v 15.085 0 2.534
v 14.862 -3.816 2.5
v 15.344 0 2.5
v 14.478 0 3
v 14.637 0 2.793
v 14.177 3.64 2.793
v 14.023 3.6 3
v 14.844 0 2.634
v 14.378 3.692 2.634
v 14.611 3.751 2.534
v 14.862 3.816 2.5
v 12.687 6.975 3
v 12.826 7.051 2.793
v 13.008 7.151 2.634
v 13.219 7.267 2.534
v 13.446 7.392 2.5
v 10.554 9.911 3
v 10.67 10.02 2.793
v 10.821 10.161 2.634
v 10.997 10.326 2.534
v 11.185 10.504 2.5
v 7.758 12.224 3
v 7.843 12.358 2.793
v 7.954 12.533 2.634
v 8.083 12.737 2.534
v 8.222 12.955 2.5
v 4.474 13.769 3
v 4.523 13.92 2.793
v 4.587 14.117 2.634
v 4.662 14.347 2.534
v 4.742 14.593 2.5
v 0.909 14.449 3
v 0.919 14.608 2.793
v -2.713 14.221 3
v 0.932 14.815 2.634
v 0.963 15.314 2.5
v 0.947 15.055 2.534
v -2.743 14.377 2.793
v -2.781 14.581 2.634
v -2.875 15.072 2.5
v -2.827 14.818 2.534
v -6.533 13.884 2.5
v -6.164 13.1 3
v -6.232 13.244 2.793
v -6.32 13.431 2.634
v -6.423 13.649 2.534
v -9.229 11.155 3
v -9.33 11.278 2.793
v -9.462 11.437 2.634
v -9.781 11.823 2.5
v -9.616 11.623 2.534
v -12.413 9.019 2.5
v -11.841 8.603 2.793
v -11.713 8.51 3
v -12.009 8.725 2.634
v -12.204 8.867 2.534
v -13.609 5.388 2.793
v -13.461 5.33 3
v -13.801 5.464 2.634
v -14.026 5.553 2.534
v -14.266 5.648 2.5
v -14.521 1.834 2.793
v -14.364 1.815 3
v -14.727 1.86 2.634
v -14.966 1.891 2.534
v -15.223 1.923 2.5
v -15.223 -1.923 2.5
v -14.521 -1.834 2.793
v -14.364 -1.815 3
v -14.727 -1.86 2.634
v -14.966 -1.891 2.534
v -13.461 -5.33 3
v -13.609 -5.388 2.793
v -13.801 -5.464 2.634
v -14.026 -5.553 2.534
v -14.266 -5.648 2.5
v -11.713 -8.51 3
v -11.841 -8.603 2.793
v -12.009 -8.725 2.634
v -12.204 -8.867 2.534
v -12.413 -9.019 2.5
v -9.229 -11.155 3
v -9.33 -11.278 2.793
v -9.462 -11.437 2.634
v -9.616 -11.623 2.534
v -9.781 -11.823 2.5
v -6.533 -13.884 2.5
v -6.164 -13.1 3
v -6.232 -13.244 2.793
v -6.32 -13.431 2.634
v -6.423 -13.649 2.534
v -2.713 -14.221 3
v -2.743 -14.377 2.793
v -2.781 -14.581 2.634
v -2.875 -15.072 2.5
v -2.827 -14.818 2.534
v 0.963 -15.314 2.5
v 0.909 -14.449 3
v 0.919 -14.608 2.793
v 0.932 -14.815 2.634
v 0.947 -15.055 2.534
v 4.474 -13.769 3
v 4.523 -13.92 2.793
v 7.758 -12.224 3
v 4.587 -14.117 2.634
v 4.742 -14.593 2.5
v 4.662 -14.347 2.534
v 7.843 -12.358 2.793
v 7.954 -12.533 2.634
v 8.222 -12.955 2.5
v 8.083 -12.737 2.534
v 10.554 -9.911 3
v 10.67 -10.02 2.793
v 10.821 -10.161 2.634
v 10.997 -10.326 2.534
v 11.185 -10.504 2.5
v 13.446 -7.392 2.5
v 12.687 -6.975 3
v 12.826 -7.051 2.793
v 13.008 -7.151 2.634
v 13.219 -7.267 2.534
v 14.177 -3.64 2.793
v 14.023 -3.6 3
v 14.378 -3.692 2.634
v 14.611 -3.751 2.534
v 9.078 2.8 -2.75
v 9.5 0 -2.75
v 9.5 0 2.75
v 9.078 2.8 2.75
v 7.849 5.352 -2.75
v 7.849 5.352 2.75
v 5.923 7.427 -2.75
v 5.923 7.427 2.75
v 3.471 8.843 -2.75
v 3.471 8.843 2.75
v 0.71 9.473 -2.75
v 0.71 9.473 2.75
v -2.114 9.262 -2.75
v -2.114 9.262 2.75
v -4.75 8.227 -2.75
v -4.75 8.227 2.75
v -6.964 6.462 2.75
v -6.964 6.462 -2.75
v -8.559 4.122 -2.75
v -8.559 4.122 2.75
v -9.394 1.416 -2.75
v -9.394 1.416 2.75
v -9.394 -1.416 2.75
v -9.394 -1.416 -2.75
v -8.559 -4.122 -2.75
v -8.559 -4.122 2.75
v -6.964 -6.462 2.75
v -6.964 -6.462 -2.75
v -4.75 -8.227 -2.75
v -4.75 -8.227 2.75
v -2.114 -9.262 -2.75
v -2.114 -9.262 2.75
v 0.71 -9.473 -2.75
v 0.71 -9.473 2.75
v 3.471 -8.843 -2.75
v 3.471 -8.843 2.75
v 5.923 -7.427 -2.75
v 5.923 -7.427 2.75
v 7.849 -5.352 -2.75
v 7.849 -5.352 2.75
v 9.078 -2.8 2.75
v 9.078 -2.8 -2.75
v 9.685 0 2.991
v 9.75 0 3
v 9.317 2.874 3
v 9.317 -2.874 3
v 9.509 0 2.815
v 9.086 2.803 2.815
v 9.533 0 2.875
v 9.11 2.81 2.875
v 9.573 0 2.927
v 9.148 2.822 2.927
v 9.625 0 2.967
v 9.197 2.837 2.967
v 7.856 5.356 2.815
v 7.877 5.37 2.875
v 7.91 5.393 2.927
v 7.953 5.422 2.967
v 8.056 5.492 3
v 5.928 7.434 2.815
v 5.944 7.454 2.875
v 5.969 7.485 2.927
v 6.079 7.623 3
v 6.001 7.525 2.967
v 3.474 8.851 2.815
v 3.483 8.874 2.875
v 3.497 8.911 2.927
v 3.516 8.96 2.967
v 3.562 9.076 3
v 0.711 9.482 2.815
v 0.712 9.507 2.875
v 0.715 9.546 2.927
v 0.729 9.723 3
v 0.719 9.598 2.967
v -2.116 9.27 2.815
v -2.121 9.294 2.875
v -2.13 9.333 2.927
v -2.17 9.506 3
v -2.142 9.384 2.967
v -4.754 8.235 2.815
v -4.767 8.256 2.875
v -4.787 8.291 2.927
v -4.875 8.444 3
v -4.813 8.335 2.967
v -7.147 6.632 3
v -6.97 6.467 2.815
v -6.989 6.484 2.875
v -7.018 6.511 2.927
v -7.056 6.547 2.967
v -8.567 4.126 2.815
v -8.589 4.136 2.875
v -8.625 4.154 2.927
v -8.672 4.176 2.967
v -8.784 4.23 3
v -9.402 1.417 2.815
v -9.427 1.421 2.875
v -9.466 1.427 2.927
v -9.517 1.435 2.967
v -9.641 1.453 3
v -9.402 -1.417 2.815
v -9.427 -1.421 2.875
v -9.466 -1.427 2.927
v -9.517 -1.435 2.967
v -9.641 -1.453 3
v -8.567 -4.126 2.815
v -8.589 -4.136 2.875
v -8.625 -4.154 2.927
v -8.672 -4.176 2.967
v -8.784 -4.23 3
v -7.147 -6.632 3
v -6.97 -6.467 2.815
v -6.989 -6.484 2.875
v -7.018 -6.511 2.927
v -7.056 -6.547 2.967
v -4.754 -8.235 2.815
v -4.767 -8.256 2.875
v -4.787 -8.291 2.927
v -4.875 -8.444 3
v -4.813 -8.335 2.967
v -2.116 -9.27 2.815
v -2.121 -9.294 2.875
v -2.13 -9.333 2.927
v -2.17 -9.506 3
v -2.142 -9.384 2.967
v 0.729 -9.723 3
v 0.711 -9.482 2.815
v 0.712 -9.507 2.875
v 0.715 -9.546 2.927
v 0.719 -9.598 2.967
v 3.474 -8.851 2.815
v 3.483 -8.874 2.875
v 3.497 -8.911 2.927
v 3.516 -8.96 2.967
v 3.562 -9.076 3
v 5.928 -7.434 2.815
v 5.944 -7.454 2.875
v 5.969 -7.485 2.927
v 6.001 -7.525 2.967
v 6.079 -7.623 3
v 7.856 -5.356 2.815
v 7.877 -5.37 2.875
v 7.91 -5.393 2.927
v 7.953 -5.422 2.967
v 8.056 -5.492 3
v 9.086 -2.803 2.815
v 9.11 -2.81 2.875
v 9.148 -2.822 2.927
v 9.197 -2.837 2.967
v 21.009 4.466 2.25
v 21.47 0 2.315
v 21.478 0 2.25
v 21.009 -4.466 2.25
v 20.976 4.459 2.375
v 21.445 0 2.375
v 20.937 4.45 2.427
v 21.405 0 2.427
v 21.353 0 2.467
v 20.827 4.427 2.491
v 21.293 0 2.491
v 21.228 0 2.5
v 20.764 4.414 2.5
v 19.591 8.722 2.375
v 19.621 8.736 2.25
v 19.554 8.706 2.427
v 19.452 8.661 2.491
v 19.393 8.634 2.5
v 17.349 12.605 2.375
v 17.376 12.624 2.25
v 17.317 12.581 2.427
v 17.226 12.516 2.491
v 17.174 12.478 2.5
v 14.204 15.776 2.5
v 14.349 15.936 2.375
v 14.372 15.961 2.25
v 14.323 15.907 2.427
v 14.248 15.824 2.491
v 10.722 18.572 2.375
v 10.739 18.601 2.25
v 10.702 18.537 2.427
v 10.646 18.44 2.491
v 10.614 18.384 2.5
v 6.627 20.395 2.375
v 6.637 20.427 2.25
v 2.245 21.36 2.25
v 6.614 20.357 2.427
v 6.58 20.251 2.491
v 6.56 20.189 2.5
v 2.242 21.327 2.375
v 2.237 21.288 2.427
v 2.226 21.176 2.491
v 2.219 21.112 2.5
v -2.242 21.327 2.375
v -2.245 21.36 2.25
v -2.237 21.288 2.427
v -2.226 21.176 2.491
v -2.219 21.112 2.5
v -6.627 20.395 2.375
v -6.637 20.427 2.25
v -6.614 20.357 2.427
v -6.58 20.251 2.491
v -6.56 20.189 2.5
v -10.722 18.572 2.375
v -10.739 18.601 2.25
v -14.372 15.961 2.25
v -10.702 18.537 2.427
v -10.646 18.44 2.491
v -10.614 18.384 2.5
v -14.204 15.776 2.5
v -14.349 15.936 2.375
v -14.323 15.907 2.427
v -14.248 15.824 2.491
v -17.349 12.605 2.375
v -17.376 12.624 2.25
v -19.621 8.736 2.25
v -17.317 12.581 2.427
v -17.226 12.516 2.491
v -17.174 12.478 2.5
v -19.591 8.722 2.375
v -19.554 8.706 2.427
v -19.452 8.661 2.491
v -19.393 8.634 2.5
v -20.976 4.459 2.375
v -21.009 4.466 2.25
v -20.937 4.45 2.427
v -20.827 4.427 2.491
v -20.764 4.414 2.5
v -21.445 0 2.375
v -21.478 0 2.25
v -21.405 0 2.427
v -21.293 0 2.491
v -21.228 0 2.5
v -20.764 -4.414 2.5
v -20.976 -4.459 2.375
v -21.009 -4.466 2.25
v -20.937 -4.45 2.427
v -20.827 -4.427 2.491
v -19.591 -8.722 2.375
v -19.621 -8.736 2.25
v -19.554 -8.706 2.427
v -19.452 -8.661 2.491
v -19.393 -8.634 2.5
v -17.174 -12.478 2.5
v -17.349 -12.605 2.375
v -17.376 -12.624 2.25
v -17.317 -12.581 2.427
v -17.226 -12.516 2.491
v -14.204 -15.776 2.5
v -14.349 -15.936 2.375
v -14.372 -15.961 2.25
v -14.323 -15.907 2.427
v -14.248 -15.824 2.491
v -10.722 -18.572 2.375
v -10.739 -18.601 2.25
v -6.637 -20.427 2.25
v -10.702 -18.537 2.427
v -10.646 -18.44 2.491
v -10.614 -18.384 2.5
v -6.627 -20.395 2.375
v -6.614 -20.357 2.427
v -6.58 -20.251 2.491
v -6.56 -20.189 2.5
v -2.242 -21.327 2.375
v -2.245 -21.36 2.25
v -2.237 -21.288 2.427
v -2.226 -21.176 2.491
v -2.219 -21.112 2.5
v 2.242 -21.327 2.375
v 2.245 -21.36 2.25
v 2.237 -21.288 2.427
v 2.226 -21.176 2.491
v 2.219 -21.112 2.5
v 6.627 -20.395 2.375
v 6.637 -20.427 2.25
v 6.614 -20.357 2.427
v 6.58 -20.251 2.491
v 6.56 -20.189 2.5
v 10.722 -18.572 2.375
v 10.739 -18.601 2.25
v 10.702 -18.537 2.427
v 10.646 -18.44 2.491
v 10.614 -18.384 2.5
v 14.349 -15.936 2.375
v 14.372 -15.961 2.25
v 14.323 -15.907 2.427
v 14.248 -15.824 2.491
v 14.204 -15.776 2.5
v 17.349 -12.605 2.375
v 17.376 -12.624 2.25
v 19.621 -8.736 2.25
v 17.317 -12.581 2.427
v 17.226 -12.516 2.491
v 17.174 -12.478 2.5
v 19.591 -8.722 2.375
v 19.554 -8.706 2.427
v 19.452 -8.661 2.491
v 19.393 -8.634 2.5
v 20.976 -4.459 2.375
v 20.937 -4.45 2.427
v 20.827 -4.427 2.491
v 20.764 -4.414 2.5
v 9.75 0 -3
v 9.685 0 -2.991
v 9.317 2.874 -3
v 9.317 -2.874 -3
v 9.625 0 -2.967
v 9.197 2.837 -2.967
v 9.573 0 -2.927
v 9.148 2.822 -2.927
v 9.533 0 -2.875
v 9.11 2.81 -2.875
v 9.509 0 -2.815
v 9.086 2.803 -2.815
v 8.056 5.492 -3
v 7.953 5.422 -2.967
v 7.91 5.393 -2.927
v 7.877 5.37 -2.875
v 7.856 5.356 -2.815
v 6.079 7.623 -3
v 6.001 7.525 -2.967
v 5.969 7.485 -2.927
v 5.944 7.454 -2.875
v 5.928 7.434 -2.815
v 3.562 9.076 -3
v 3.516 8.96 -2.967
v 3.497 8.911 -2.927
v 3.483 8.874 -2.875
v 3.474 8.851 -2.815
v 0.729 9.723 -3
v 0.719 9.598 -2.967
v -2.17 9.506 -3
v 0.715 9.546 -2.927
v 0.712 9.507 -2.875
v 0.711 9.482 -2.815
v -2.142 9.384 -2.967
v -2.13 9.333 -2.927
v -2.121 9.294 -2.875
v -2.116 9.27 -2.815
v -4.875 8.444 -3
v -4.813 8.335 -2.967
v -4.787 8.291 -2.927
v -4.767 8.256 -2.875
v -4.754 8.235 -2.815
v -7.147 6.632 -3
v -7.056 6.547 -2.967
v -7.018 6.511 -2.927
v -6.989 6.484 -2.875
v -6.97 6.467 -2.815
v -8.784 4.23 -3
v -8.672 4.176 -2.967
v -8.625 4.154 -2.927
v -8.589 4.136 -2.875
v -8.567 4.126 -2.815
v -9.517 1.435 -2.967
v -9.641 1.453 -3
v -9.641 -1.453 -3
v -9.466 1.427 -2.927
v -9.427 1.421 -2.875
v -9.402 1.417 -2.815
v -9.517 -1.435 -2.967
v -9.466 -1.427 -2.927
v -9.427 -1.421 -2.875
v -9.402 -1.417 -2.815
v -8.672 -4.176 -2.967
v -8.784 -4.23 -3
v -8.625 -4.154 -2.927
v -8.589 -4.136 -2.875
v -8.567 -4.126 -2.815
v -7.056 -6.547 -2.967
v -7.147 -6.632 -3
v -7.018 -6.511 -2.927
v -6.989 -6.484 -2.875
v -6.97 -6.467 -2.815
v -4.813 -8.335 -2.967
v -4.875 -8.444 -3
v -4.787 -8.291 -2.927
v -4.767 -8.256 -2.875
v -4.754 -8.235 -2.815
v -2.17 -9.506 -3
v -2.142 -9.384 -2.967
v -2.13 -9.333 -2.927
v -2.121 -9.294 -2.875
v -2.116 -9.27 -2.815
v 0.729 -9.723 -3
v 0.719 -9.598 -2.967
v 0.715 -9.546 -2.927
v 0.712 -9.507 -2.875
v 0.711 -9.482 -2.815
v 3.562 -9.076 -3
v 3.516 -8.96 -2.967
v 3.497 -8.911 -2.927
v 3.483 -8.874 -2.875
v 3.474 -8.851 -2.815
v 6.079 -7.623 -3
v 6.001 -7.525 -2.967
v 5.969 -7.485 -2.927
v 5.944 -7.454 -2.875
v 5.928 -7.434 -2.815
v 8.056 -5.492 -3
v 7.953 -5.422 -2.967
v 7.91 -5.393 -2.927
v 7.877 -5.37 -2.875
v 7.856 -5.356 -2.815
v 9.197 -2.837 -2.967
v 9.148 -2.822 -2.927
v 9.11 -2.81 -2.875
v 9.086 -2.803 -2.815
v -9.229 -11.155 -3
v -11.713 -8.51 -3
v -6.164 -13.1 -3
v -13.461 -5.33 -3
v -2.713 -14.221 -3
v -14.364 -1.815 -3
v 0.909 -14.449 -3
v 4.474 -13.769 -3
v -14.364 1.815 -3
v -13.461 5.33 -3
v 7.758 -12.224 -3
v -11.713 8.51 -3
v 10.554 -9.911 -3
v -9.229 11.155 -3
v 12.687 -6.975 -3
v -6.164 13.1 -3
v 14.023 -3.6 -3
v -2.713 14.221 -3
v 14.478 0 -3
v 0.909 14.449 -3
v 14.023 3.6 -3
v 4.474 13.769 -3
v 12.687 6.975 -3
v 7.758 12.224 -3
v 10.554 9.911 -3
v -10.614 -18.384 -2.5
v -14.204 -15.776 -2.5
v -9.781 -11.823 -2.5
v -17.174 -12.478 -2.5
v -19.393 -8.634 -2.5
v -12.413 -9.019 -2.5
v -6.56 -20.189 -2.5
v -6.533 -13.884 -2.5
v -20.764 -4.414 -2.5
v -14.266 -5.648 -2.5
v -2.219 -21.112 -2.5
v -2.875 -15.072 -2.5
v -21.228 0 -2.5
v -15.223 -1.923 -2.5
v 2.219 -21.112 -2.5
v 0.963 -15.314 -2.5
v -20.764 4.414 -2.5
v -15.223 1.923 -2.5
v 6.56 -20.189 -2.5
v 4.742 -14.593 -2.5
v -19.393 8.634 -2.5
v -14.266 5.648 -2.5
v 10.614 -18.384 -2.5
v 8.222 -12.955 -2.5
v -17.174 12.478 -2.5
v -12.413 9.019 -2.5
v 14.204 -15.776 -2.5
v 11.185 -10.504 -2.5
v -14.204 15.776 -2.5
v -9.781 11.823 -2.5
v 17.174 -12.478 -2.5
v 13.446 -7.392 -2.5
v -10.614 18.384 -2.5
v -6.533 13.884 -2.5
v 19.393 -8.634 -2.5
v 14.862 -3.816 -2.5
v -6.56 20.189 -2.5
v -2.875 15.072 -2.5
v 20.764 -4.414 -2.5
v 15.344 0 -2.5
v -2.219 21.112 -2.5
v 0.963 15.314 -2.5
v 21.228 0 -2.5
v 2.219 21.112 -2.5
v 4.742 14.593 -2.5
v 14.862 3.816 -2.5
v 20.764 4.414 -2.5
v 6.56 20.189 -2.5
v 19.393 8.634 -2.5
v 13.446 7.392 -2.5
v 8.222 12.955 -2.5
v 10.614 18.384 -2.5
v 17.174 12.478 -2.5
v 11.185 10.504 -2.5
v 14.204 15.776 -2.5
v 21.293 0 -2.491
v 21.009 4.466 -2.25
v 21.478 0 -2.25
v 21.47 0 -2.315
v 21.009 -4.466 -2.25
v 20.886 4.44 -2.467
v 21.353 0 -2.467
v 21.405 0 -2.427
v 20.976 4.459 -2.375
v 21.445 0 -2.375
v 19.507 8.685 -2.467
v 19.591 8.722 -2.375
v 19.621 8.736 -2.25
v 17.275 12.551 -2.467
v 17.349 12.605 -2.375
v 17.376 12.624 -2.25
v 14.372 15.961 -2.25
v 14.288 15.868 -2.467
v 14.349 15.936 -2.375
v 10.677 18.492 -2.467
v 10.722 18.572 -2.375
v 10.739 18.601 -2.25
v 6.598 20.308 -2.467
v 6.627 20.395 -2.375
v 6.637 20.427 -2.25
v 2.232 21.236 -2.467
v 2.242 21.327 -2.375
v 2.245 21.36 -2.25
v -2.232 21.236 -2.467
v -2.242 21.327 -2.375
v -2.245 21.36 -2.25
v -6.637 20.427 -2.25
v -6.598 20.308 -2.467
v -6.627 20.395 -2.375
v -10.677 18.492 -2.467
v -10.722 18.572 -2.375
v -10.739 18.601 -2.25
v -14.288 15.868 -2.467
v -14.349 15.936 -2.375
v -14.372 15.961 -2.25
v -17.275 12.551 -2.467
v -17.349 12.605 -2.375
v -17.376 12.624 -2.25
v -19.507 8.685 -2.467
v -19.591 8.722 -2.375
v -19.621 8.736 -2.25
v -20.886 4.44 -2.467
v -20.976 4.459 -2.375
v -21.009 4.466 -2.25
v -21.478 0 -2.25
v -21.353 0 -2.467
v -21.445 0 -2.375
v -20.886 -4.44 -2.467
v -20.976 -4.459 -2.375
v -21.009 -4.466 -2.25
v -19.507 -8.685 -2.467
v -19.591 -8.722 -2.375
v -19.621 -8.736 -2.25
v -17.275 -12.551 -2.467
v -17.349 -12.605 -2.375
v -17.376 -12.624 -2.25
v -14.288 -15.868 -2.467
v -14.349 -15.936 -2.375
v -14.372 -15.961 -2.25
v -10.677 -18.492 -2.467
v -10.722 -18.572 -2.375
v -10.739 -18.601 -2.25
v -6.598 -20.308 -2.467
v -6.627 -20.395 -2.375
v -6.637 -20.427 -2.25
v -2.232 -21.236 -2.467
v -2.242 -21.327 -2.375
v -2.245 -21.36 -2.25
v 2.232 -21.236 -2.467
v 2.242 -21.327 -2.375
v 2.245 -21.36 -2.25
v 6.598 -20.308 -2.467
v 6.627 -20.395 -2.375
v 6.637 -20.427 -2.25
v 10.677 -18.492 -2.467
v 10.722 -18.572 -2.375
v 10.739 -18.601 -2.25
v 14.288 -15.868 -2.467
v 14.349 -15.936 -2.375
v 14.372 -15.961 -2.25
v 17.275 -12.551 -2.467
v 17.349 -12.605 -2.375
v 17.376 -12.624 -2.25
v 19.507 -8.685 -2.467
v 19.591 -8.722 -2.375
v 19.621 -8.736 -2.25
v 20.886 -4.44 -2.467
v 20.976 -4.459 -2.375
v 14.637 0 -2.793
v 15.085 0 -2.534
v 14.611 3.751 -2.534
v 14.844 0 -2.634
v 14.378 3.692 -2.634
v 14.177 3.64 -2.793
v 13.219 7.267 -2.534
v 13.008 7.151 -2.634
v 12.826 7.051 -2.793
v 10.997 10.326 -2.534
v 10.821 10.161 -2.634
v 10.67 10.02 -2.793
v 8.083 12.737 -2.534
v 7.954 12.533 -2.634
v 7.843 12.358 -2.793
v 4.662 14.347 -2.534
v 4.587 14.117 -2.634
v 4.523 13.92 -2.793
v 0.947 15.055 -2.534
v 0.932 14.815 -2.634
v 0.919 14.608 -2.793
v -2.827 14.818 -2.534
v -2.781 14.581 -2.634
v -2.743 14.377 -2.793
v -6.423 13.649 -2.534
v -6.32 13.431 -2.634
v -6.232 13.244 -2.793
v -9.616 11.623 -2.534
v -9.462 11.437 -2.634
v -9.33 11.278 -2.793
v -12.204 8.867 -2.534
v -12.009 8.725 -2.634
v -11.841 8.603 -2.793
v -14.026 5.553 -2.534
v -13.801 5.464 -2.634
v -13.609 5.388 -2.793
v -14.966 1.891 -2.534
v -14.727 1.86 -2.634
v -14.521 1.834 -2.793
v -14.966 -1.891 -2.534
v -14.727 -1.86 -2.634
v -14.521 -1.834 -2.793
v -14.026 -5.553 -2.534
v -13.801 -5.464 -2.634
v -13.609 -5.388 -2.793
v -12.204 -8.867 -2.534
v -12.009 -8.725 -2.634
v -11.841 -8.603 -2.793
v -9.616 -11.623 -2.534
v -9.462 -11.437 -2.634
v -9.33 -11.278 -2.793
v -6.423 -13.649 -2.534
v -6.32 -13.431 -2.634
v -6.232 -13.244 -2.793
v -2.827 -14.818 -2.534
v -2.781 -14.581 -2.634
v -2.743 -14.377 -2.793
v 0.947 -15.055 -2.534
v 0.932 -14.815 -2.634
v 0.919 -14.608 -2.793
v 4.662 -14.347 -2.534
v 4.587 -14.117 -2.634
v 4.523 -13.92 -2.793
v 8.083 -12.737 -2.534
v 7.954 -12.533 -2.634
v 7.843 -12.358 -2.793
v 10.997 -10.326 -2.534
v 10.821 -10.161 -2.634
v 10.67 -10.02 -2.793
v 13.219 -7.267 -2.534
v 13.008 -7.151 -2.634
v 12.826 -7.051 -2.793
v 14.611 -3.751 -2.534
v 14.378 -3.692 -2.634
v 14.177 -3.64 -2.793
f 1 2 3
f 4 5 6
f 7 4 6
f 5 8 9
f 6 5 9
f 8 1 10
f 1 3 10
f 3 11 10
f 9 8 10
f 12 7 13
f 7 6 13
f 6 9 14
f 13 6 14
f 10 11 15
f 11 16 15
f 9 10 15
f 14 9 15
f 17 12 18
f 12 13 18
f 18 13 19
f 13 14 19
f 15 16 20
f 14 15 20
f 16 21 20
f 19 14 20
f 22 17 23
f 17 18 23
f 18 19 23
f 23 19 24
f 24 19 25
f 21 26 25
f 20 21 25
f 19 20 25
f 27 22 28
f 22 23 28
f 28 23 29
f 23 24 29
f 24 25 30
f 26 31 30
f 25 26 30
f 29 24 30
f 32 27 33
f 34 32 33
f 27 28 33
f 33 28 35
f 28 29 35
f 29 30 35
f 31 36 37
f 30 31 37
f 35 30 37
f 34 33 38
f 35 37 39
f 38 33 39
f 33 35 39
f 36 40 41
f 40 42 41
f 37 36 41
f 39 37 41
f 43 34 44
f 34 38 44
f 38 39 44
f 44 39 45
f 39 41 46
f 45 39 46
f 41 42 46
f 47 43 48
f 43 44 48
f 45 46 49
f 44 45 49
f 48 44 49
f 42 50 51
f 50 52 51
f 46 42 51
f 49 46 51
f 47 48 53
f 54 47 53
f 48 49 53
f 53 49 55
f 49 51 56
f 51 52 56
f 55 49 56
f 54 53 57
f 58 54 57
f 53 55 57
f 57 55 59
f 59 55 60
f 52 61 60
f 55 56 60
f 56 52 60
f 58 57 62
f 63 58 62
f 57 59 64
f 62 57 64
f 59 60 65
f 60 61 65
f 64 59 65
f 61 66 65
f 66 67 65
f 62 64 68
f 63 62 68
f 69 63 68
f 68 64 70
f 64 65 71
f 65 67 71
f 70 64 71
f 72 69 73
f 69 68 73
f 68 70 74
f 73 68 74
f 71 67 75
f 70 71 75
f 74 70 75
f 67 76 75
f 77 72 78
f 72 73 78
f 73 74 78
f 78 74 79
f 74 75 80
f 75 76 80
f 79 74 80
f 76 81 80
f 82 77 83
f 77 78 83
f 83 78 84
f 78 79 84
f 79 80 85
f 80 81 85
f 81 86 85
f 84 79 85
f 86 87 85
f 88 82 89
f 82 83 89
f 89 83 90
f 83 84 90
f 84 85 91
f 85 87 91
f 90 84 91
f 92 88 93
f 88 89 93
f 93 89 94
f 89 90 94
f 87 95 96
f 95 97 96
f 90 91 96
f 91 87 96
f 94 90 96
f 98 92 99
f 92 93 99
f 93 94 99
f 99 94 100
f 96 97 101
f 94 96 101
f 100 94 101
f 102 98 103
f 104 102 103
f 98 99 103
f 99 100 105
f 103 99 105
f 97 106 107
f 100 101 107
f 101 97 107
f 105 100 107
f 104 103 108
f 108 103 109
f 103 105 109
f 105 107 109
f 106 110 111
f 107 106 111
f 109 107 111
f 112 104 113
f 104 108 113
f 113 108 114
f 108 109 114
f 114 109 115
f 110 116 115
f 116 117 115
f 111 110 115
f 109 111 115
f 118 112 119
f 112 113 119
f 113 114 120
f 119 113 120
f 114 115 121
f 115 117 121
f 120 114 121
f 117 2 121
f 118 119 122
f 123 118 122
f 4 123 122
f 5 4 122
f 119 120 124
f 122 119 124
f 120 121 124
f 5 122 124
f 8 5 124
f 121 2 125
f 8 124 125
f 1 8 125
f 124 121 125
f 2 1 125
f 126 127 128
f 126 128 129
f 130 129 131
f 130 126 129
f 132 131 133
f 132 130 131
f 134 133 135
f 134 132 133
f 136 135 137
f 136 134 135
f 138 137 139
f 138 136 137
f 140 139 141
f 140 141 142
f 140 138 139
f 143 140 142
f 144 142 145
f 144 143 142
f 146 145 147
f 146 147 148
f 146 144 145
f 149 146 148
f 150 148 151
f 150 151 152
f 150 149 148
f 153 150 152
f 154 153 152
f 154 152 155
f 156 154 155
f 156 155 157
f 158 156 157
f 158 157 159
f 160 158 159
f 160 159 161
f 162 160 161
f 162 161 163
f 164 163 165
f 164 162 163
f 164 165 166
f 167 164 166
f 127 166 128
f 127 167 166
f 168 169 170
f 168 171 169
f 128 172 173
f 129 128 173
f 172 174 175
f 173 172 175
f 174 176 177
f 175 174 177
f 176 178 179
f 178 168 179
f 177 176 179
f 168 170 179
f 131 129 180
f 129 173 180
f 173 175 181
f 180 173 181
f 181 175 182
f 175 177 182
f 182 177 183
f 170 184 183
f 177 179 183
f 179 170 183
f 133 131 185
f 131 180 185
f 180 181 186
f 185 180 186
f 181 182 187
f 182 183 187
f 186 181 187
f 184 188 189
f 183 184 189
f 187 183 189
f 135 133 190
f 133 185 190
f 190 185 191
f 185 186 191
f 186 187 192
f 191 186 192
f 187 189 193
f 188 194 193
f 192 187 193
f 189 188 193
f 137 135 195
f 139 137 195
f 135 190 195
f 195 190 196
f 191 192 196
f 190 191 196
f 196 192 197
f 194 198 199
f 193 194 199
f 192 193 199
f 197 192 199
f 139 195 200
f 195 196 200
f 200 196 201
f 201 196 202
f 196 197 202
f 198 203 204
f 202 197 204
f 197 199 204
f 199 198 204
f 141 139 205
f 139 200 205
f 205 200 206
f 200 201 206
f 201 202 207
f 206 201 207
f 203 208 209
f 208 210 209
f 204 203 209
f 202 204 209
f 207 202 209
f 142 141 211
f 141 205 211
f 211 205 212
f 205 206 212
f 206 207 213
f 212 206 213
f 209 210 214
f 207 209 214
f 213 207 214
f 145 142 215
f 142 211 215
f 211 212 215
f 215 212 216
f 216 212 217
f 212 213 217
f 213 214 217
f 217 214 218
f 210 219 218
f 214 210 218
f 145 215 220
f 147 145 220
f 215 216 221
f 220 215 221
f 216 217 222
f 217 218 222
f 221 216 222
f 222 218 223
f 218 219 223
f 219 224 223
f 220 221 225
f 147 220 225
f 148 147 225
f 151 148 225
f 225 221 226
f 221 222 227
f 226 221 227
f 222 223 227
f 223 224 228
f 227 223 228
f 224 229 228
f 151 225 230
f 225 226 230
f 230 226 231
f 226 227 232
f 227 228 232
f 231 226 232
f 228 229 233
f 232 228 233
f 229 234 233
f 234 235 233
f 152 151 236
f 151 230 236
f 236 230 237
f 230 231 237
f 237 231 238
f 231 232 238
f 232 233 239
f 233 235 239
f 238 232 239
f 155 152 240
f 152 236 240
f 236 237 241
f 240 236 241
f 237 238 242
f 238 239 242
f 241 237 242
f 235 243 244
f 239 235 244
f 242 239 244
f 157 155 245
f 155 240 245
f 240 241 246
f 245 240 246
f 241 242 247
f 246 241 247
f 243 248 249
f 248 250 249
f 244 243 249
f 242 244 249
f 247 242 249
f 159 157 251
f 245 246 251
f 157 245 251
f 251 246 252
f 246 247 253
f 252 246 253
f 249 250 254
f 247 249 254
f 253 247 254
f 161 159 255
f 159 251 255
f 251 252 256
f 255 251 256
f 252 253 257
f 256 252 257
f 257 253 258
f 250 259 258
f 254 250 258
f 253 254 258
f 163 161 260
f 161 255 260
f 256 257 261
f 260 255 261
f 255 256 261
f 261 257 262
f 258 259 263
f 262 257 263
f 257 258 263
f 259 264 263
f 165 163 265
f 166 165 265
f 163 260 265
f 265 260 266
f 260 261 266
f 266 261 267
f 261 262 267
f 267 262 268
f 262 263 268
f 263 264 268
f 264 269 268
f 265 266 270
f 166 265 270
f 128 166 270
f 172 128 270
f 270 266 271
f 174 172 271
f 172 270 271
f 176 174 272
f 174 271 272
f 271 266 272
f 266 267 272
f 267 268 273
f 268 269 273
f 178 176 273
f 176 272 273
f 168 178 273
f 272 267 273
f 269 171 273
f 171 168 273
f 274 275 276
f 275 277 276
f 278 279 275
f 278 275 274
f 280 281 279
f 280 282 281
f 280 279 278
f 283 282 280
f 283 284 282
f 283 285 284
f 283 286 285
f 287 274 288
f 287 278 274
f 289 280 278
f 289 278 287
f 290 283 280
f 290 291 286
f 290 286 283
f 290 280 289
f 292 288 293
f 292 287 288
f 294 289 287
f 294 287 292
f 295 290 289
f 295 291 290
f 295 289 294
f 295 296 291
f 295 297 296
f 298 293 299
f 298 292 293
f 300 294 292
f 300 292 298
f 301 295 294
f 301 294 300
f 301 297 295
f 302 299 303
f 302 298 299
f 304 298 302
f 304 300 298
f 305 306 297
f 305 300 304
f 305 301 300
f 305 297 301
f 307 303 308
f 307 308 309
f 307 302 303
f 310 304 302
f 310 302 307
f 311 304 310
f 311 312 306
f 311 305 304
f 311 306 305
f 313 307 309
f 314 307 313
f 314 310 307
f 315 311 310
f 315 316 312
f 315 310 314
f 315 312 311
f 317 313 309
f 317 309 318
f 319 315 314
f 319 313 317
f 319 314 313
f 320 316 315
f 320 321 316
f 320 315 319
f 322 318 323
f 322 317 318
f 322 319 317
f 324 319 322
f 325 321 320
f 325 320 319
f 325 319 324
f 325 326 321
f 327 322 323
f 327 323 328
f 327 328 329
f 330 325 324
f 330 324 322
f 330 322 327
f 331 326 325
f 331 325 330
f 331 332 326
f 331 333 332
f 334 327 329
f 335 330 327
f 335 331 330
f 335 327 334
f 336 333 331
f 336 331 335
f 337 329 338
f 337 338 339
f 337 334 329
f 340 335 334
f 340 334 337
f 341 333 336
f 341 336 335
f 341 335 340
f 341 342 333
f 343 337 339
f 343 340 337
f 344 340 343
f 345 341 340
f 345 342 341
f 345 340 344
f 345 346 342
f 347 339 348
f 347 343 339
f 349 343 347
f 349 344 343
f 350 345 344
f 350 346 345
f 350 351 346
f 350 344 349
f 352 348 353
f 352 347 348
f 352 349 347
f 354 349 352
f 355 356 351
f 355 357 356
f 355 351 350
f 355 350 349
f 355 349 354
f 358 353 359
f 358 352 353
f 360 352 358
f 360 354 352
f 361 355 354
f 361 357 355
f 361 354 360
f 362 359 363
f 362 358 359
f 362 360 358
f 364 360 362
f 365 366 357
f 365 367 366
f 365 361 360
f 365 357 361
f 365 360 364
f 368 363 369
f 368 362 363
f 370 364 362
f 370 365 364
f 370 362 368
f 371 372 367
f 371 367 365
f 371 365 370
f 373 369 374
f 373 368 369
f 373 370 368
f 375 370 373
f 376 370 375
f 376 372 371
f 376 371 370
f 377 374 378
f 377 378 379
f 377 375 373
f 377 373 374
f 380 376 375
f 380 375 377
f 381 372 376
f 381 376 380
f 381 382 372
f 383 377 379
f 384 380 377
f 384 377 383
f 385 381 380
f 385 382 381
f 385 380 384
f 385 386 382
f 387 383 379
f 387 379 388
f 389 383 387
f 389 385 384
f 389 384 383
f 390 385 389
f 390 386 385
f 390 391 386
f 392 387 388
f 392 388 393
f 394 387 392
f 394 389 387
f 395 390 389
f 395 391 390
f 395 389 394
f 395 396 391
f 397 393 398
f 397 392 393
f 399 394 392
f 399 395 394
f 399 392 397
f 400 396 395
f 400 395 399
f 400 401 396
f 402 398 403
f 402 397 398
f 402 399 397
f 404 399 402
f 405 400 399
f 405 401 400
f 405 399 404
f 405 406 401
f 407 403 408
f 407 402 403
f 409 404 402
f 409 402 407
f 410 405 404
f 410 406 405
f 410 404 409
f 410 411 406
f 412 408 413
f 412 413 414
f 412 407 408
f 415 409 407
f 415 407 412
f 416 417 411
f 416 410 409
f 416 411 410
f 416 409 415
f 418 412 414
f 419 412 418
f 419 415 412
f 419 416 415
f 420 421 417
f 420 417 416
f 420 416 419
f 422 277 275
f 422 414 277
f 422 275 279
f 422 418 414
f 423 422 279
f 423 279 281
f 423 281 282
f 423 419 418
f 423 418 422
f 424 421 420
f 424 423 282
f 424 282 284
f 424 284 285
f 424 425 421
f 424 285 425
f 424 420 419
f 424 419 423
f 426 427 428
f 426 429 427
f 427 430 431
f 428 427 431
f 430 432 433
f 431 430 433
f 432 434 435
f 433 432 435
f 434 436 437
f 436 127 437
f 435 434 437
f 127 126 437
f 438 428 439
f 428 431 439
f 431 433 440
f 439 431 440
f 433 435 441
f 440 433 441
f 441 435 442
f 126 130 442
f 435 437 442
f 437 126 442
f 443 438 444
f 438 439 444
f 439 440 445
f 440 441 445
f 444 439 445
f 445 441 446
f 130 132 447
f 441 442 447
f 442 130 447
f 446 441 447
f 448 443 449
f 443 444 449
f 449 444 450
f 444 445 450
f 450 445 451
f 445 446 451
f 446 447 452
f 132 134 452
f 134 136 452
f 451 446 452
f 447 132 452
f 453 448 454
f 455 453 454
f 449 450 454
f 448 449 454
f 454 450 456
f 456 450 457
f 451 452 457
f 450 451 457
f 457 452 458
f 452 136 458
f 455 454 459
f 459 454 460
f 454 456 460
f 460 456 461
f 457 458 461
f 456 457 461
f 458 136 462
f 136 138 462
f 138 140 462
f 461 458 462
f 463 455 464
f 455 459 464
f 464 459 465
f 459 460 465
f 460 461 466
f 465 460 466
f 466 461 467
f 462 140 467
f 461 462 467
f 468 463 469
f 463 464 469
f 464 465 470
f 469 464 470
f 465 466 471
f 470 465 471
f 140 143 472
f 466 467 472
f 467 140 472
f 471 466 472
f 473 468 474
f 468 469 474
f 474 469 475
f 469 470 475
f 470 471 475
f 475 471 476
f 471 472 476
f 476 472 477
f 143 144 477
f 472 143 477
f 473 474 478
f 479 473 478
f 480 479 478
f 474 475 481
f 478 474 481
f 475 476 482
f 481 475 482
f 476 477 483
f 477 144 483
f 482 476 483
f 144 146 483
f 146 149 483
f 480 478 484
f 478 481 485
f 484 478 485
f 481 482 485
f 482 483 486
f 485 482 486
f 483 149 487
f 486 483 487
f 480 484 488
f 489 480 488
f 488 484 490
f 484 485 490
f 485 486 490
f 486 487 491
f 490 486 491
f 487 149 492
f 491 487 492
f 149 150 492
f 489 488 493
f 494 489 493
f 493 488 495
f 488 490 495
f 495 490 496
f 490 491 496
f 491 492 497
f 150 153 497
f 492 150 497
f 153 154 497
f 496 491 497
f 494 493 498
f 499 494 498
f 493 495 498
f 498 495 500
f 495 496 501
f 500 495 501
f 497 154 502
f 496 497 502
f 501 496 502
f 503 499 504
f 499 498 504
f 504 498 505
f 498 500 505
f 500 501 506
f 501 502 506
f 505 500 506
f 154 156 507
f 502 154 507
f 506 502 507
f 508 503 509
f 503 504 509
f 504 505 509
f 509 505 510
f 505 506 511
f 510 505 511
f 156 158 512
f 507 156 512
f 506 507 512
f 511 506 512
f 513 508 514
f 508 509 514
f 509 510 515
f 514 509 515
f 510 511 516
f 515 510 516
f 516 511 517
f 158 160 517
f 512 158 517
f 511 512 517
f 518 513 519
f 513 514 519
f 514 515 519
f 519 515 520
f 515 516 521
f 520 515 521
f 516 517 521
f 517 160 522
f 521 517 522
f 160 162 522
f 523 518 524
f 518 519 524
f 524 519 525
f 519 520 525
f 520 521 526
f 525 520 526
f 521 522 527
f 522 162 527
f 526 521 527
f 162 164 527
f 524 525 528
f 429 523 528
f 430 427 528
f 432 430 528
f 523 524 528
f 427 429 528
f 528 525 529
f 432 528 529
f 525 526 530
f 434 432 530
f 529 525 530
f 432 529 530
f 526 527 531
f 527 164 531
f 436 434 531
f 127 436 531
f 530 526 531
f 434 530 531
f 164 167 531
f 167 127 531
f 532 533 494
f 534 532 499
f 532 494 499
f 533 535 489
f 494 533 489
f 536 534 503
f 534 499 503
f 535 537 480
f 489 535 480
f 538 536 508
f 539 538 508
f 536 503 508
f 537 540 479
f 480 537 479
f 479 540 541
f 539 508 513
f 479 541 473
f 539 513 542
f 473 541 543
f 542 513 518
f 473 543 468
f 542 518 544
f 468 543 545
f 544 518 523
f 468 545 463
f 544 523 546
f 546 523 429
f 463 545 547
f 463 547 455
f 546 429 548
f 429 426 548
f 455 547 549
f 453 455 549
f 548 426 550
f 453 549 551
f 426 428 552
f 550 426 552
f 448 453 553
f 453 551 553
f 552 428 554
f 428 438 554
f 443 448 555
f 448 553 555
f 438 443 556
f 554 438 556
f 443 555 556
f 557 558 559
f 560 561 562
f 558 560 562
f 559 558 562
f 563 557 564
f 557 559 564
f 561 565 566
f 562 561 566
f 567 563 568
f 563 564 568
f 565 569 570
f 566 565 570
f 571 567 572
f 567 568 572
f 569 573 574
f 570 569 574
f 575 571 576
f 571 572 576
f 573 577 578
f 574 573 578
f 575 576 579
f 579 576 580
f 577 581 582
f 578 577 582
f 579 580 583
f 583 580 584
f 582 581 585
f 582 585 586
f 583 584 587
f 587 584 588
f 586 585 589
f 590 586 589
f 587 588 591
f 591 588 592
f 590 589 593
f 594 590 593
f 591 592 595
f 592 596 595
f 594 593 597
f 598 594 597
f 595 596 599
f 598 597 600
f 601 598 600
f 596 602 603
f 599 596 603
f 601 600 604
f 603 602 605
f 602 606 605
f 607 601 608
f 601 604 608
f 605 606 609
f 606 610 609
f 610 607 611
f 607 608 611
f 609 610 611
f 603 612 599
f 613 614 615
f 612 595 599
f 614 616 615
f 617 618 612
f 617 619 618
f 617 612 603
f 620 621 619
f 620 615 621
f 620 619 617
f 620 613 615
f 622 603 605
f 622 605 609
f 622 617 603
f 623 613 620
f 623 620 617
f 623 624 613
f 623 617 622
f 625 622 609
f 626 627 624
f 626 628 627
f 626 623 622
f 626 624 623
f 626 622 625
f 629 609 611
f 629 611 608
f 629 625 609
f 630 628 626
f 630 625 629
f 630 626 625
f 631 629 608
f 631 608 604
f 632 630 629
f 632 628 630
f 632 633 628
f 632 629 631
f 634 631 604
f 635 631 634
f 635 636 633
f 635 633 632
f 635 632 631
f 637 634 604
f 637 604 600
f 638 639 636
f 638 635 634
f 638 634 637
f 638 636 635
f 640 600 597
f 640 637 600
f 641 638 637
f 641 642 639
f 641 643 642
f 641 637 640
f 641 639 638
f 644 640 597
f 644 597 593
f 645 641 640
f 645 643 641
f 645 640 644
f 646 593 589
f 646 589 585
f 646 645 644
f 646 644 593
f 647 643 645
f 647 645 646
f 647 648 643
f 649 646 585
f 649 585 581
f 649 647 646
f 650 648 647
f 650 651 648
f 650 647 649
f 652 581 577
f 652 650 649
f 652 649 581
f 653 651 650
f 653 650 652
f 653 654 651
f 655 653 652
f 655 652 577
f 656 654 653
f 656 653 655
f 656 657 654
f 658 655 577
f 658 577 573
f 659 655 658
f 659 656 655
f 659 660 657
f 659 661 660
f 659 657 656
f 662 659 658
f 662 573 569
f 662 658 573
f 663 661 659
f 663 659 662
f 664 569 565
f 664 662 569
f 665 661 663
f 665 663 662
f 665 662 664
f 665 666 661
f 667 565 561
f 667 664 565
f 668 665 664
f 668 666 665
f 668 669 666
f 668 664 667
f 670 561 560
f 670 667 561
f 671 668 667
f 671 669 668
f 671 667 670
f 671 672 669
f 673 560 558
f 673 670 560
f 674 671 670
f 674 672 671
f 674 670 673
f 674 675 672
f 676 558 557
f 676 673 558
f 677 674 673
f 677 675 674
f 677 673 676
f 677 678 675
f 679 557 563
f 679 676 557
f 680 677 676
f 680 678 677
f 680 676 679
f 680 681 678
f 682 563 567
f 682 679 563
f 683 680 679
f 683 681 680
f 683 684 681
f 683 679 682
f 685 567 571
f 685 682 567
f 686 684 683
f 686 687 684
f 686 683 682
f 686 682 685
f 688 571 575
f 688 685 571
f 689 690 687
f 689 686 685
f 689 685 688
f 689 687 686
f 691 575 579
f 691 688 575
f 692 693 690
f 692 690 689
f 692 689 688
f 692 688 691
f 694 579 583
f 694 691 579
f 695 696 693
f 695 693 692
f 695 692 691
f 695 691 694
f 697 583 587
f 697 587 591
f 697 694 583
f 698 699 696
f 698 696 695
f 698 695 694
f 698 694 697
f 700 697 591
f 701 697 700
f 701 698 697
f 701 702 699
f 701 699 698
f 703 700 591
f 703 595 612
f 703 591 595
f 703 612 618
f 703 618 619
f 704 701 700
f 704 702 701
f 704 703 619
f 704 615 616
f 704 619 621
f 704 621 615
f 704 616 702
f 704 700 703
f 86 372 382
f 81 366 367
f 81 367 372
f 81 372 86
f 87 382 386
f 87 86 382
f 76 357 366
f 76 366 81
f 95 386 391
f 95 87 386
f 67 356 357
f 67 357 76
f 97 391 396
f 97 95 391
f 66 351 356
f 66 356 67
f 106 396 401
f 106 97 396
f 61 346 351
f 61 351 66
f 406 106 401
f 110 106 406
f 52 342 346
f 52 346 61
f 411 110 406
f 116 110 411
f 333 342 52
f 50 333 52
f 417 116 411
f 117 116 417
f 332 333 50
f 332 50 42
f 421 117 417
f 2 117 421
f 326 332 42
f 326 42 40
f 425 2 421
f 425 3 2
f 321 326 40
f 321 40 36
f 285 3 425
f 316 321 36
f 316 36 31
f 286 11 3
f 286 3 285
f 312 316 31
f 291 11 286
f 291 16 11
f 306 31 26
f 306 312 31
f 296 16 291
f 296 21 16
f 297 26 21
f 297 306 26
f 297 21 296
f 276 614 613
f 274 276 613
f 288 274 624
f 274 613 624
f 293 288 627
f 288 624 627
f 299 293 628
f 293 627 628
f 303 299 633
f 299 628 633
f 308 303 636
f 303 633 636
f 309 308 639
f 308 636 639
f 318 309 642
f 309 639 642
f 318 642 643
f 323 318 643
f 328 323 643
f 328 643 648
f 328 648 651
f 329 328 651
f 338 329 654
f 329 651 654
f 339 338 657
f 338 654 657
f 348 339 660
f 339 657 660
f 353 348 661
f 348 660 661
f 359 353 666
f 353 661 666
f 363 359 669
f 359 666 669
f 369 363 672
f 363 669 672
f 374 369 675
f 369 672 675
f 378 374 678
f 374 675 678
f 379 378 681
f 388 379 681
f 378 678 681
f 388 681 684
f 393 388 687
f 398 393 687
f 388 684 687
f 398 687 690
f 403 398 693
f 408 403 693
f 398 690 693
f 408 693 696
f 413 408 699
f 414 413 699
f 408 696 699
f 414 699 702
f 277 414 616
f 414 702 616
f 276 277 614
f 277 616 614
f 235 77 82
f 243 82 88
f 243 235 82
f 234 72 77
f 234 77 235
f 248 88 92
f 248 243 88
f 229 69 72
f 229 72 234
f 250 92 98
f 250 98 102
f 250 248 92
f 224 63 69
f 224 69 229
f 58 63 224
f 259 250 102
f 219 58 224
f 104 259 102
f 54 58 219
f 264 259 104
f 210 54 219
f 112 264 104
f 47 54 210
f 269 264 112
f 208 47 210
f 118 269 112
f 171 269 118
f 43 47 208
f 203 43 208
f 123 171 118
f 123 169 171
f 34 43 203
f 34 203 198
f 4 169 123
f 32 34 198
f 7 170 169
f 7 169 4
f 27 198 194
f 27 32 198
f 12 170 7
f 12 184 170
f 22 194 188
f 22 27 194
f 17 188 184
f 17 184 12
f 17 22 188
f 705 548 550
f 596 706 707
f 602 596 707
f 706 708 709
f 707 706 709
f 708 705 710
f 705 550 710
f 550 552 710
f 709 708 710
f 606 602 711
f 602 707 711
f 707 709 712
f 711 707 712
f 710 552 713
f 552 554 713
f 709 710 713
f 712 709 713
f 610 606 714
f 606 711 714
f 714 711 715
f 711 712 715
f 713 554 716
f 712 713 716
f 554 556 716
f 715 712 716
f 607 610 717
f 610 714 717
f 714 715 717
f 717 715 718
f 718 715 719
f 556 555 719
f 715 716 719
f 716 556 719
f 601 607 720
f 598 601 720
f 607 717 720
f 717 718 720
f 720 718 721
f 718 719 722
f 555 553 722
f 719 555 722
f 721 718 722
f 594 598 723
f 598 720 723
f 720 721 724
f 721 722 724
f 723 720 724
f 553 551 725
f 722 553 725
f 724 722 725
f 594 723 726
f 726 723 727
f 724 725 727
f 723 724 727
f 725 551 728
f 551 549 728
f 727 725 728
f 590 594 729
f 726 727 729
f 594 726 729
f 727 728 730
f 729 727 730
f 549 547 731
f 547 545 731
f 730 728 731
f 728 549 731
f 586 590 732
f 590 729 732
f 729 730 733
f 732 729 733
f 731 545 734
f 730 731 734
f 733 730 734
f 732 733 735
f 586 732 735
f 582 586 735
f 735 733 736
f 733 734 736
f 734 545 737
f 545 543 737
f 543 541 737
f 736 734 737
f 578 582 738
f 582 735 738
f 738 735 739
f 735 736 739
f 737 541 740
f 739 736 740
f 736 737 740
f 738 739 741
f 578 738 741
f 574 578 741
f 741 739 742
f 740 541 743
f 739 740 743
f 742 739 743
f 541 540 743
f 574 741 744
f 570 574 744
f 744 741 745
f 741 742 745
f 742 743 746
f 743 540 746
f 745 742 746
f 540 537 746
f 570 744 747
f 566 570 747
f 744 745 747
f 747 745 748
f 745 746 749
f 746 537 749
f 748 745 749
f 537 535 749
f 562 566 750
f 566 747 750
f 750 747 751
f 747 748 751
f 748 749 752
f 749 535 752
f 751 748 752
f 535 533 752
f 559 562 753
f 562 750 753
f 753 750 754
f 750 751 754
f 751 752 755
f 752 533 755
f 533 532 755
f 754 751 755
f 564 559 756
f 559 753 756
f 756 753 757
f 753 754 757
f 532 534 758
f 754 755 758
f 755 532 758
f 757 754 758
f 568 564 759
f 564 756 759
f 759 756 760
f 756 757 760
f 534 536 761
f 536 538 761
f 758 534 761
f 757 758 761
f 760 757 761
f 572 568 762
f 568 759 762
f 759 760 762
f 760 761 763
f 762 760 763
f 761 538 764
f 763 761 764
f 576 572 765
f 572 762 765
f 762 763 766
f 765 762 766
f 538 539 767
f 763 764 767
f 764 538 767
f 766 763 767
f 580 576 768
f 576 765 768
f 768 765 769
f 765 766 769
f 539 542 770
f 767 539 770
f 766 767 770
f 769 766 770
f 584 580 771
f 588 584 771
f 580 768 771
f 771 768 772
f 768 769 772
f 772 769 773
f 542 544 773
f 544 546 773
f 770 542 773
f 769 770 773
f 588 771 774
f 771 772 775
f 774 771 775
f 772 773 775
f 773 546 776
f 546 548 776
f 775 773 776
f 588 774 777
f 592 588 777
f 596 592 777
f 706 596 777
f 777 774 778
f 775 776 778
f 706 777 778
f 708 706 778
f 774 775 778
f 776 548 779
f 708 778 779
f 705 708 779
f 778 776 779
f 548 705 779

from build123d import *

# Parameters (mm, degrees)
BOSS_EXTRU_1_DEPTH      = 3
BOSS_EXTRU_1_DEPTH_BACK = 3
ESQUISSE1_R             = 14.477835748
ESQUISSE1_R_2           = 9.5
BOSS_EXTRU_2_DEPTH      = 2.5
BOSS_EXTRU_2_DEPTH_BACK = 2.5
ESQUISSE3_R             = 21.478063627
ESQUISSE3_R_2           = 14.477835748
CONG_1_R                = 0.25
CONG_2_R                = 1
CONG_3_R                = 0.25


with BuildPart() as part:
    # Esquisse1 → Boss.-Extru.1 (new, two sides: drawn at the far end of the back side and taken through both)
    with BuildSketch(Plane.XY.offset(-BOSS_EXTRU_1_DEPTH_BACK)):
        Circle(ESQUISSE1_R)
        Circle(ESQUISSE1_R_2, mode=Mode.SUBTRACT)
    extrude(amount=BOSS_EXTRU_1_DEPTH + BOSS_EXTRU_1_DEPTH_BACK)

    # Esquisse3 → Boss.-Extru.2 (add, two sides: drawn at the far end of the back side and taken through both)
    with BuildSketch(Plane.XY.offset(-BOSS_EXTRU_2_DEPTH_BACK)):
        Circle(ESQUISSE3_R)
        Circle(ESQUISSE3_R_2, mode=Mode.SUBTRACT)
    extrude(amount=BOSS_EXTRU_2_DEPTH + BOSS_EXTRU_2_DEPTH_BACK)

    # Congé1
    cong_1_edges = [part.edges().sort_by_distance(p)[0] for p in [
        (-21.478063627, 0, -2.5),
        (-21.478063627, 0, 2.5),
    ]]
    fillet(cong_1_edges, radius=CONG_1_R)

    # Congé2
    # the kernel refuses this fillet: 1 mm, written as the material it adds along each edge
    with BuildSketch(Plane(origin=(0, 0, 2.5), x_dir=(1, 0, 0), z_dir=(0, -1, 0))) as cong_2_piece_1:
        with BuildLine():
            CenterArc((15.343861152, 1), CONG_2_R, 210, 60)
            Line((14.477835748, 0.5), (14.46051524, 0.49))
            ThreePointArc((14.46051524, 0.49), (14.457835748, 0.25), (14.457835748, 0))
            Line((14.457835748, 0), (14.477835748, -0.02))
            Line((14.477835748, -0.02), (15.343861152, -0.02))
            Line((15.343861152, -0.02), (15.343861152, 0))
        make_face()
    revolve(axis=Axis((0, 0, 2.5), (0, 0, 1)))
    with BuildSketch(Plane(origin=(0, 0, -2.5), x_dir=(1, 0, 0), z_dir=(0, -1, 0))) as cong_2_piece_2:
        with BuildLine():
            CenterArc((15.343861152, -1), CONG_2_R, 90, 60)
            Line((14.477835748, -0.5), (14.46051524, -0.49))
            ThreePointArc((14.46051524, -0.49), (14.457835748, -0.25), (14.457835748, 0))
            Line((14.457835748, 0), (14.477835748, 0.02))
            Line((14.477835748, 0.02), (15.343861152, 0.02))
            Line((15.343861152, 0.02), (15.343861152, 0))
        make_face()
    revolve(axis=Axis((0, 0, -2.5), (0, 0, 1)))

    # Congé3
    cong_3_edges = [part.edges().sort_by_distance(p)[0] for p in [
        (-9.5, 0, -3),
        (-9.5, 0, 3),
    ]]
    fillet(cong_3_edges, radius=CONG_3_R)


solid = part.part
